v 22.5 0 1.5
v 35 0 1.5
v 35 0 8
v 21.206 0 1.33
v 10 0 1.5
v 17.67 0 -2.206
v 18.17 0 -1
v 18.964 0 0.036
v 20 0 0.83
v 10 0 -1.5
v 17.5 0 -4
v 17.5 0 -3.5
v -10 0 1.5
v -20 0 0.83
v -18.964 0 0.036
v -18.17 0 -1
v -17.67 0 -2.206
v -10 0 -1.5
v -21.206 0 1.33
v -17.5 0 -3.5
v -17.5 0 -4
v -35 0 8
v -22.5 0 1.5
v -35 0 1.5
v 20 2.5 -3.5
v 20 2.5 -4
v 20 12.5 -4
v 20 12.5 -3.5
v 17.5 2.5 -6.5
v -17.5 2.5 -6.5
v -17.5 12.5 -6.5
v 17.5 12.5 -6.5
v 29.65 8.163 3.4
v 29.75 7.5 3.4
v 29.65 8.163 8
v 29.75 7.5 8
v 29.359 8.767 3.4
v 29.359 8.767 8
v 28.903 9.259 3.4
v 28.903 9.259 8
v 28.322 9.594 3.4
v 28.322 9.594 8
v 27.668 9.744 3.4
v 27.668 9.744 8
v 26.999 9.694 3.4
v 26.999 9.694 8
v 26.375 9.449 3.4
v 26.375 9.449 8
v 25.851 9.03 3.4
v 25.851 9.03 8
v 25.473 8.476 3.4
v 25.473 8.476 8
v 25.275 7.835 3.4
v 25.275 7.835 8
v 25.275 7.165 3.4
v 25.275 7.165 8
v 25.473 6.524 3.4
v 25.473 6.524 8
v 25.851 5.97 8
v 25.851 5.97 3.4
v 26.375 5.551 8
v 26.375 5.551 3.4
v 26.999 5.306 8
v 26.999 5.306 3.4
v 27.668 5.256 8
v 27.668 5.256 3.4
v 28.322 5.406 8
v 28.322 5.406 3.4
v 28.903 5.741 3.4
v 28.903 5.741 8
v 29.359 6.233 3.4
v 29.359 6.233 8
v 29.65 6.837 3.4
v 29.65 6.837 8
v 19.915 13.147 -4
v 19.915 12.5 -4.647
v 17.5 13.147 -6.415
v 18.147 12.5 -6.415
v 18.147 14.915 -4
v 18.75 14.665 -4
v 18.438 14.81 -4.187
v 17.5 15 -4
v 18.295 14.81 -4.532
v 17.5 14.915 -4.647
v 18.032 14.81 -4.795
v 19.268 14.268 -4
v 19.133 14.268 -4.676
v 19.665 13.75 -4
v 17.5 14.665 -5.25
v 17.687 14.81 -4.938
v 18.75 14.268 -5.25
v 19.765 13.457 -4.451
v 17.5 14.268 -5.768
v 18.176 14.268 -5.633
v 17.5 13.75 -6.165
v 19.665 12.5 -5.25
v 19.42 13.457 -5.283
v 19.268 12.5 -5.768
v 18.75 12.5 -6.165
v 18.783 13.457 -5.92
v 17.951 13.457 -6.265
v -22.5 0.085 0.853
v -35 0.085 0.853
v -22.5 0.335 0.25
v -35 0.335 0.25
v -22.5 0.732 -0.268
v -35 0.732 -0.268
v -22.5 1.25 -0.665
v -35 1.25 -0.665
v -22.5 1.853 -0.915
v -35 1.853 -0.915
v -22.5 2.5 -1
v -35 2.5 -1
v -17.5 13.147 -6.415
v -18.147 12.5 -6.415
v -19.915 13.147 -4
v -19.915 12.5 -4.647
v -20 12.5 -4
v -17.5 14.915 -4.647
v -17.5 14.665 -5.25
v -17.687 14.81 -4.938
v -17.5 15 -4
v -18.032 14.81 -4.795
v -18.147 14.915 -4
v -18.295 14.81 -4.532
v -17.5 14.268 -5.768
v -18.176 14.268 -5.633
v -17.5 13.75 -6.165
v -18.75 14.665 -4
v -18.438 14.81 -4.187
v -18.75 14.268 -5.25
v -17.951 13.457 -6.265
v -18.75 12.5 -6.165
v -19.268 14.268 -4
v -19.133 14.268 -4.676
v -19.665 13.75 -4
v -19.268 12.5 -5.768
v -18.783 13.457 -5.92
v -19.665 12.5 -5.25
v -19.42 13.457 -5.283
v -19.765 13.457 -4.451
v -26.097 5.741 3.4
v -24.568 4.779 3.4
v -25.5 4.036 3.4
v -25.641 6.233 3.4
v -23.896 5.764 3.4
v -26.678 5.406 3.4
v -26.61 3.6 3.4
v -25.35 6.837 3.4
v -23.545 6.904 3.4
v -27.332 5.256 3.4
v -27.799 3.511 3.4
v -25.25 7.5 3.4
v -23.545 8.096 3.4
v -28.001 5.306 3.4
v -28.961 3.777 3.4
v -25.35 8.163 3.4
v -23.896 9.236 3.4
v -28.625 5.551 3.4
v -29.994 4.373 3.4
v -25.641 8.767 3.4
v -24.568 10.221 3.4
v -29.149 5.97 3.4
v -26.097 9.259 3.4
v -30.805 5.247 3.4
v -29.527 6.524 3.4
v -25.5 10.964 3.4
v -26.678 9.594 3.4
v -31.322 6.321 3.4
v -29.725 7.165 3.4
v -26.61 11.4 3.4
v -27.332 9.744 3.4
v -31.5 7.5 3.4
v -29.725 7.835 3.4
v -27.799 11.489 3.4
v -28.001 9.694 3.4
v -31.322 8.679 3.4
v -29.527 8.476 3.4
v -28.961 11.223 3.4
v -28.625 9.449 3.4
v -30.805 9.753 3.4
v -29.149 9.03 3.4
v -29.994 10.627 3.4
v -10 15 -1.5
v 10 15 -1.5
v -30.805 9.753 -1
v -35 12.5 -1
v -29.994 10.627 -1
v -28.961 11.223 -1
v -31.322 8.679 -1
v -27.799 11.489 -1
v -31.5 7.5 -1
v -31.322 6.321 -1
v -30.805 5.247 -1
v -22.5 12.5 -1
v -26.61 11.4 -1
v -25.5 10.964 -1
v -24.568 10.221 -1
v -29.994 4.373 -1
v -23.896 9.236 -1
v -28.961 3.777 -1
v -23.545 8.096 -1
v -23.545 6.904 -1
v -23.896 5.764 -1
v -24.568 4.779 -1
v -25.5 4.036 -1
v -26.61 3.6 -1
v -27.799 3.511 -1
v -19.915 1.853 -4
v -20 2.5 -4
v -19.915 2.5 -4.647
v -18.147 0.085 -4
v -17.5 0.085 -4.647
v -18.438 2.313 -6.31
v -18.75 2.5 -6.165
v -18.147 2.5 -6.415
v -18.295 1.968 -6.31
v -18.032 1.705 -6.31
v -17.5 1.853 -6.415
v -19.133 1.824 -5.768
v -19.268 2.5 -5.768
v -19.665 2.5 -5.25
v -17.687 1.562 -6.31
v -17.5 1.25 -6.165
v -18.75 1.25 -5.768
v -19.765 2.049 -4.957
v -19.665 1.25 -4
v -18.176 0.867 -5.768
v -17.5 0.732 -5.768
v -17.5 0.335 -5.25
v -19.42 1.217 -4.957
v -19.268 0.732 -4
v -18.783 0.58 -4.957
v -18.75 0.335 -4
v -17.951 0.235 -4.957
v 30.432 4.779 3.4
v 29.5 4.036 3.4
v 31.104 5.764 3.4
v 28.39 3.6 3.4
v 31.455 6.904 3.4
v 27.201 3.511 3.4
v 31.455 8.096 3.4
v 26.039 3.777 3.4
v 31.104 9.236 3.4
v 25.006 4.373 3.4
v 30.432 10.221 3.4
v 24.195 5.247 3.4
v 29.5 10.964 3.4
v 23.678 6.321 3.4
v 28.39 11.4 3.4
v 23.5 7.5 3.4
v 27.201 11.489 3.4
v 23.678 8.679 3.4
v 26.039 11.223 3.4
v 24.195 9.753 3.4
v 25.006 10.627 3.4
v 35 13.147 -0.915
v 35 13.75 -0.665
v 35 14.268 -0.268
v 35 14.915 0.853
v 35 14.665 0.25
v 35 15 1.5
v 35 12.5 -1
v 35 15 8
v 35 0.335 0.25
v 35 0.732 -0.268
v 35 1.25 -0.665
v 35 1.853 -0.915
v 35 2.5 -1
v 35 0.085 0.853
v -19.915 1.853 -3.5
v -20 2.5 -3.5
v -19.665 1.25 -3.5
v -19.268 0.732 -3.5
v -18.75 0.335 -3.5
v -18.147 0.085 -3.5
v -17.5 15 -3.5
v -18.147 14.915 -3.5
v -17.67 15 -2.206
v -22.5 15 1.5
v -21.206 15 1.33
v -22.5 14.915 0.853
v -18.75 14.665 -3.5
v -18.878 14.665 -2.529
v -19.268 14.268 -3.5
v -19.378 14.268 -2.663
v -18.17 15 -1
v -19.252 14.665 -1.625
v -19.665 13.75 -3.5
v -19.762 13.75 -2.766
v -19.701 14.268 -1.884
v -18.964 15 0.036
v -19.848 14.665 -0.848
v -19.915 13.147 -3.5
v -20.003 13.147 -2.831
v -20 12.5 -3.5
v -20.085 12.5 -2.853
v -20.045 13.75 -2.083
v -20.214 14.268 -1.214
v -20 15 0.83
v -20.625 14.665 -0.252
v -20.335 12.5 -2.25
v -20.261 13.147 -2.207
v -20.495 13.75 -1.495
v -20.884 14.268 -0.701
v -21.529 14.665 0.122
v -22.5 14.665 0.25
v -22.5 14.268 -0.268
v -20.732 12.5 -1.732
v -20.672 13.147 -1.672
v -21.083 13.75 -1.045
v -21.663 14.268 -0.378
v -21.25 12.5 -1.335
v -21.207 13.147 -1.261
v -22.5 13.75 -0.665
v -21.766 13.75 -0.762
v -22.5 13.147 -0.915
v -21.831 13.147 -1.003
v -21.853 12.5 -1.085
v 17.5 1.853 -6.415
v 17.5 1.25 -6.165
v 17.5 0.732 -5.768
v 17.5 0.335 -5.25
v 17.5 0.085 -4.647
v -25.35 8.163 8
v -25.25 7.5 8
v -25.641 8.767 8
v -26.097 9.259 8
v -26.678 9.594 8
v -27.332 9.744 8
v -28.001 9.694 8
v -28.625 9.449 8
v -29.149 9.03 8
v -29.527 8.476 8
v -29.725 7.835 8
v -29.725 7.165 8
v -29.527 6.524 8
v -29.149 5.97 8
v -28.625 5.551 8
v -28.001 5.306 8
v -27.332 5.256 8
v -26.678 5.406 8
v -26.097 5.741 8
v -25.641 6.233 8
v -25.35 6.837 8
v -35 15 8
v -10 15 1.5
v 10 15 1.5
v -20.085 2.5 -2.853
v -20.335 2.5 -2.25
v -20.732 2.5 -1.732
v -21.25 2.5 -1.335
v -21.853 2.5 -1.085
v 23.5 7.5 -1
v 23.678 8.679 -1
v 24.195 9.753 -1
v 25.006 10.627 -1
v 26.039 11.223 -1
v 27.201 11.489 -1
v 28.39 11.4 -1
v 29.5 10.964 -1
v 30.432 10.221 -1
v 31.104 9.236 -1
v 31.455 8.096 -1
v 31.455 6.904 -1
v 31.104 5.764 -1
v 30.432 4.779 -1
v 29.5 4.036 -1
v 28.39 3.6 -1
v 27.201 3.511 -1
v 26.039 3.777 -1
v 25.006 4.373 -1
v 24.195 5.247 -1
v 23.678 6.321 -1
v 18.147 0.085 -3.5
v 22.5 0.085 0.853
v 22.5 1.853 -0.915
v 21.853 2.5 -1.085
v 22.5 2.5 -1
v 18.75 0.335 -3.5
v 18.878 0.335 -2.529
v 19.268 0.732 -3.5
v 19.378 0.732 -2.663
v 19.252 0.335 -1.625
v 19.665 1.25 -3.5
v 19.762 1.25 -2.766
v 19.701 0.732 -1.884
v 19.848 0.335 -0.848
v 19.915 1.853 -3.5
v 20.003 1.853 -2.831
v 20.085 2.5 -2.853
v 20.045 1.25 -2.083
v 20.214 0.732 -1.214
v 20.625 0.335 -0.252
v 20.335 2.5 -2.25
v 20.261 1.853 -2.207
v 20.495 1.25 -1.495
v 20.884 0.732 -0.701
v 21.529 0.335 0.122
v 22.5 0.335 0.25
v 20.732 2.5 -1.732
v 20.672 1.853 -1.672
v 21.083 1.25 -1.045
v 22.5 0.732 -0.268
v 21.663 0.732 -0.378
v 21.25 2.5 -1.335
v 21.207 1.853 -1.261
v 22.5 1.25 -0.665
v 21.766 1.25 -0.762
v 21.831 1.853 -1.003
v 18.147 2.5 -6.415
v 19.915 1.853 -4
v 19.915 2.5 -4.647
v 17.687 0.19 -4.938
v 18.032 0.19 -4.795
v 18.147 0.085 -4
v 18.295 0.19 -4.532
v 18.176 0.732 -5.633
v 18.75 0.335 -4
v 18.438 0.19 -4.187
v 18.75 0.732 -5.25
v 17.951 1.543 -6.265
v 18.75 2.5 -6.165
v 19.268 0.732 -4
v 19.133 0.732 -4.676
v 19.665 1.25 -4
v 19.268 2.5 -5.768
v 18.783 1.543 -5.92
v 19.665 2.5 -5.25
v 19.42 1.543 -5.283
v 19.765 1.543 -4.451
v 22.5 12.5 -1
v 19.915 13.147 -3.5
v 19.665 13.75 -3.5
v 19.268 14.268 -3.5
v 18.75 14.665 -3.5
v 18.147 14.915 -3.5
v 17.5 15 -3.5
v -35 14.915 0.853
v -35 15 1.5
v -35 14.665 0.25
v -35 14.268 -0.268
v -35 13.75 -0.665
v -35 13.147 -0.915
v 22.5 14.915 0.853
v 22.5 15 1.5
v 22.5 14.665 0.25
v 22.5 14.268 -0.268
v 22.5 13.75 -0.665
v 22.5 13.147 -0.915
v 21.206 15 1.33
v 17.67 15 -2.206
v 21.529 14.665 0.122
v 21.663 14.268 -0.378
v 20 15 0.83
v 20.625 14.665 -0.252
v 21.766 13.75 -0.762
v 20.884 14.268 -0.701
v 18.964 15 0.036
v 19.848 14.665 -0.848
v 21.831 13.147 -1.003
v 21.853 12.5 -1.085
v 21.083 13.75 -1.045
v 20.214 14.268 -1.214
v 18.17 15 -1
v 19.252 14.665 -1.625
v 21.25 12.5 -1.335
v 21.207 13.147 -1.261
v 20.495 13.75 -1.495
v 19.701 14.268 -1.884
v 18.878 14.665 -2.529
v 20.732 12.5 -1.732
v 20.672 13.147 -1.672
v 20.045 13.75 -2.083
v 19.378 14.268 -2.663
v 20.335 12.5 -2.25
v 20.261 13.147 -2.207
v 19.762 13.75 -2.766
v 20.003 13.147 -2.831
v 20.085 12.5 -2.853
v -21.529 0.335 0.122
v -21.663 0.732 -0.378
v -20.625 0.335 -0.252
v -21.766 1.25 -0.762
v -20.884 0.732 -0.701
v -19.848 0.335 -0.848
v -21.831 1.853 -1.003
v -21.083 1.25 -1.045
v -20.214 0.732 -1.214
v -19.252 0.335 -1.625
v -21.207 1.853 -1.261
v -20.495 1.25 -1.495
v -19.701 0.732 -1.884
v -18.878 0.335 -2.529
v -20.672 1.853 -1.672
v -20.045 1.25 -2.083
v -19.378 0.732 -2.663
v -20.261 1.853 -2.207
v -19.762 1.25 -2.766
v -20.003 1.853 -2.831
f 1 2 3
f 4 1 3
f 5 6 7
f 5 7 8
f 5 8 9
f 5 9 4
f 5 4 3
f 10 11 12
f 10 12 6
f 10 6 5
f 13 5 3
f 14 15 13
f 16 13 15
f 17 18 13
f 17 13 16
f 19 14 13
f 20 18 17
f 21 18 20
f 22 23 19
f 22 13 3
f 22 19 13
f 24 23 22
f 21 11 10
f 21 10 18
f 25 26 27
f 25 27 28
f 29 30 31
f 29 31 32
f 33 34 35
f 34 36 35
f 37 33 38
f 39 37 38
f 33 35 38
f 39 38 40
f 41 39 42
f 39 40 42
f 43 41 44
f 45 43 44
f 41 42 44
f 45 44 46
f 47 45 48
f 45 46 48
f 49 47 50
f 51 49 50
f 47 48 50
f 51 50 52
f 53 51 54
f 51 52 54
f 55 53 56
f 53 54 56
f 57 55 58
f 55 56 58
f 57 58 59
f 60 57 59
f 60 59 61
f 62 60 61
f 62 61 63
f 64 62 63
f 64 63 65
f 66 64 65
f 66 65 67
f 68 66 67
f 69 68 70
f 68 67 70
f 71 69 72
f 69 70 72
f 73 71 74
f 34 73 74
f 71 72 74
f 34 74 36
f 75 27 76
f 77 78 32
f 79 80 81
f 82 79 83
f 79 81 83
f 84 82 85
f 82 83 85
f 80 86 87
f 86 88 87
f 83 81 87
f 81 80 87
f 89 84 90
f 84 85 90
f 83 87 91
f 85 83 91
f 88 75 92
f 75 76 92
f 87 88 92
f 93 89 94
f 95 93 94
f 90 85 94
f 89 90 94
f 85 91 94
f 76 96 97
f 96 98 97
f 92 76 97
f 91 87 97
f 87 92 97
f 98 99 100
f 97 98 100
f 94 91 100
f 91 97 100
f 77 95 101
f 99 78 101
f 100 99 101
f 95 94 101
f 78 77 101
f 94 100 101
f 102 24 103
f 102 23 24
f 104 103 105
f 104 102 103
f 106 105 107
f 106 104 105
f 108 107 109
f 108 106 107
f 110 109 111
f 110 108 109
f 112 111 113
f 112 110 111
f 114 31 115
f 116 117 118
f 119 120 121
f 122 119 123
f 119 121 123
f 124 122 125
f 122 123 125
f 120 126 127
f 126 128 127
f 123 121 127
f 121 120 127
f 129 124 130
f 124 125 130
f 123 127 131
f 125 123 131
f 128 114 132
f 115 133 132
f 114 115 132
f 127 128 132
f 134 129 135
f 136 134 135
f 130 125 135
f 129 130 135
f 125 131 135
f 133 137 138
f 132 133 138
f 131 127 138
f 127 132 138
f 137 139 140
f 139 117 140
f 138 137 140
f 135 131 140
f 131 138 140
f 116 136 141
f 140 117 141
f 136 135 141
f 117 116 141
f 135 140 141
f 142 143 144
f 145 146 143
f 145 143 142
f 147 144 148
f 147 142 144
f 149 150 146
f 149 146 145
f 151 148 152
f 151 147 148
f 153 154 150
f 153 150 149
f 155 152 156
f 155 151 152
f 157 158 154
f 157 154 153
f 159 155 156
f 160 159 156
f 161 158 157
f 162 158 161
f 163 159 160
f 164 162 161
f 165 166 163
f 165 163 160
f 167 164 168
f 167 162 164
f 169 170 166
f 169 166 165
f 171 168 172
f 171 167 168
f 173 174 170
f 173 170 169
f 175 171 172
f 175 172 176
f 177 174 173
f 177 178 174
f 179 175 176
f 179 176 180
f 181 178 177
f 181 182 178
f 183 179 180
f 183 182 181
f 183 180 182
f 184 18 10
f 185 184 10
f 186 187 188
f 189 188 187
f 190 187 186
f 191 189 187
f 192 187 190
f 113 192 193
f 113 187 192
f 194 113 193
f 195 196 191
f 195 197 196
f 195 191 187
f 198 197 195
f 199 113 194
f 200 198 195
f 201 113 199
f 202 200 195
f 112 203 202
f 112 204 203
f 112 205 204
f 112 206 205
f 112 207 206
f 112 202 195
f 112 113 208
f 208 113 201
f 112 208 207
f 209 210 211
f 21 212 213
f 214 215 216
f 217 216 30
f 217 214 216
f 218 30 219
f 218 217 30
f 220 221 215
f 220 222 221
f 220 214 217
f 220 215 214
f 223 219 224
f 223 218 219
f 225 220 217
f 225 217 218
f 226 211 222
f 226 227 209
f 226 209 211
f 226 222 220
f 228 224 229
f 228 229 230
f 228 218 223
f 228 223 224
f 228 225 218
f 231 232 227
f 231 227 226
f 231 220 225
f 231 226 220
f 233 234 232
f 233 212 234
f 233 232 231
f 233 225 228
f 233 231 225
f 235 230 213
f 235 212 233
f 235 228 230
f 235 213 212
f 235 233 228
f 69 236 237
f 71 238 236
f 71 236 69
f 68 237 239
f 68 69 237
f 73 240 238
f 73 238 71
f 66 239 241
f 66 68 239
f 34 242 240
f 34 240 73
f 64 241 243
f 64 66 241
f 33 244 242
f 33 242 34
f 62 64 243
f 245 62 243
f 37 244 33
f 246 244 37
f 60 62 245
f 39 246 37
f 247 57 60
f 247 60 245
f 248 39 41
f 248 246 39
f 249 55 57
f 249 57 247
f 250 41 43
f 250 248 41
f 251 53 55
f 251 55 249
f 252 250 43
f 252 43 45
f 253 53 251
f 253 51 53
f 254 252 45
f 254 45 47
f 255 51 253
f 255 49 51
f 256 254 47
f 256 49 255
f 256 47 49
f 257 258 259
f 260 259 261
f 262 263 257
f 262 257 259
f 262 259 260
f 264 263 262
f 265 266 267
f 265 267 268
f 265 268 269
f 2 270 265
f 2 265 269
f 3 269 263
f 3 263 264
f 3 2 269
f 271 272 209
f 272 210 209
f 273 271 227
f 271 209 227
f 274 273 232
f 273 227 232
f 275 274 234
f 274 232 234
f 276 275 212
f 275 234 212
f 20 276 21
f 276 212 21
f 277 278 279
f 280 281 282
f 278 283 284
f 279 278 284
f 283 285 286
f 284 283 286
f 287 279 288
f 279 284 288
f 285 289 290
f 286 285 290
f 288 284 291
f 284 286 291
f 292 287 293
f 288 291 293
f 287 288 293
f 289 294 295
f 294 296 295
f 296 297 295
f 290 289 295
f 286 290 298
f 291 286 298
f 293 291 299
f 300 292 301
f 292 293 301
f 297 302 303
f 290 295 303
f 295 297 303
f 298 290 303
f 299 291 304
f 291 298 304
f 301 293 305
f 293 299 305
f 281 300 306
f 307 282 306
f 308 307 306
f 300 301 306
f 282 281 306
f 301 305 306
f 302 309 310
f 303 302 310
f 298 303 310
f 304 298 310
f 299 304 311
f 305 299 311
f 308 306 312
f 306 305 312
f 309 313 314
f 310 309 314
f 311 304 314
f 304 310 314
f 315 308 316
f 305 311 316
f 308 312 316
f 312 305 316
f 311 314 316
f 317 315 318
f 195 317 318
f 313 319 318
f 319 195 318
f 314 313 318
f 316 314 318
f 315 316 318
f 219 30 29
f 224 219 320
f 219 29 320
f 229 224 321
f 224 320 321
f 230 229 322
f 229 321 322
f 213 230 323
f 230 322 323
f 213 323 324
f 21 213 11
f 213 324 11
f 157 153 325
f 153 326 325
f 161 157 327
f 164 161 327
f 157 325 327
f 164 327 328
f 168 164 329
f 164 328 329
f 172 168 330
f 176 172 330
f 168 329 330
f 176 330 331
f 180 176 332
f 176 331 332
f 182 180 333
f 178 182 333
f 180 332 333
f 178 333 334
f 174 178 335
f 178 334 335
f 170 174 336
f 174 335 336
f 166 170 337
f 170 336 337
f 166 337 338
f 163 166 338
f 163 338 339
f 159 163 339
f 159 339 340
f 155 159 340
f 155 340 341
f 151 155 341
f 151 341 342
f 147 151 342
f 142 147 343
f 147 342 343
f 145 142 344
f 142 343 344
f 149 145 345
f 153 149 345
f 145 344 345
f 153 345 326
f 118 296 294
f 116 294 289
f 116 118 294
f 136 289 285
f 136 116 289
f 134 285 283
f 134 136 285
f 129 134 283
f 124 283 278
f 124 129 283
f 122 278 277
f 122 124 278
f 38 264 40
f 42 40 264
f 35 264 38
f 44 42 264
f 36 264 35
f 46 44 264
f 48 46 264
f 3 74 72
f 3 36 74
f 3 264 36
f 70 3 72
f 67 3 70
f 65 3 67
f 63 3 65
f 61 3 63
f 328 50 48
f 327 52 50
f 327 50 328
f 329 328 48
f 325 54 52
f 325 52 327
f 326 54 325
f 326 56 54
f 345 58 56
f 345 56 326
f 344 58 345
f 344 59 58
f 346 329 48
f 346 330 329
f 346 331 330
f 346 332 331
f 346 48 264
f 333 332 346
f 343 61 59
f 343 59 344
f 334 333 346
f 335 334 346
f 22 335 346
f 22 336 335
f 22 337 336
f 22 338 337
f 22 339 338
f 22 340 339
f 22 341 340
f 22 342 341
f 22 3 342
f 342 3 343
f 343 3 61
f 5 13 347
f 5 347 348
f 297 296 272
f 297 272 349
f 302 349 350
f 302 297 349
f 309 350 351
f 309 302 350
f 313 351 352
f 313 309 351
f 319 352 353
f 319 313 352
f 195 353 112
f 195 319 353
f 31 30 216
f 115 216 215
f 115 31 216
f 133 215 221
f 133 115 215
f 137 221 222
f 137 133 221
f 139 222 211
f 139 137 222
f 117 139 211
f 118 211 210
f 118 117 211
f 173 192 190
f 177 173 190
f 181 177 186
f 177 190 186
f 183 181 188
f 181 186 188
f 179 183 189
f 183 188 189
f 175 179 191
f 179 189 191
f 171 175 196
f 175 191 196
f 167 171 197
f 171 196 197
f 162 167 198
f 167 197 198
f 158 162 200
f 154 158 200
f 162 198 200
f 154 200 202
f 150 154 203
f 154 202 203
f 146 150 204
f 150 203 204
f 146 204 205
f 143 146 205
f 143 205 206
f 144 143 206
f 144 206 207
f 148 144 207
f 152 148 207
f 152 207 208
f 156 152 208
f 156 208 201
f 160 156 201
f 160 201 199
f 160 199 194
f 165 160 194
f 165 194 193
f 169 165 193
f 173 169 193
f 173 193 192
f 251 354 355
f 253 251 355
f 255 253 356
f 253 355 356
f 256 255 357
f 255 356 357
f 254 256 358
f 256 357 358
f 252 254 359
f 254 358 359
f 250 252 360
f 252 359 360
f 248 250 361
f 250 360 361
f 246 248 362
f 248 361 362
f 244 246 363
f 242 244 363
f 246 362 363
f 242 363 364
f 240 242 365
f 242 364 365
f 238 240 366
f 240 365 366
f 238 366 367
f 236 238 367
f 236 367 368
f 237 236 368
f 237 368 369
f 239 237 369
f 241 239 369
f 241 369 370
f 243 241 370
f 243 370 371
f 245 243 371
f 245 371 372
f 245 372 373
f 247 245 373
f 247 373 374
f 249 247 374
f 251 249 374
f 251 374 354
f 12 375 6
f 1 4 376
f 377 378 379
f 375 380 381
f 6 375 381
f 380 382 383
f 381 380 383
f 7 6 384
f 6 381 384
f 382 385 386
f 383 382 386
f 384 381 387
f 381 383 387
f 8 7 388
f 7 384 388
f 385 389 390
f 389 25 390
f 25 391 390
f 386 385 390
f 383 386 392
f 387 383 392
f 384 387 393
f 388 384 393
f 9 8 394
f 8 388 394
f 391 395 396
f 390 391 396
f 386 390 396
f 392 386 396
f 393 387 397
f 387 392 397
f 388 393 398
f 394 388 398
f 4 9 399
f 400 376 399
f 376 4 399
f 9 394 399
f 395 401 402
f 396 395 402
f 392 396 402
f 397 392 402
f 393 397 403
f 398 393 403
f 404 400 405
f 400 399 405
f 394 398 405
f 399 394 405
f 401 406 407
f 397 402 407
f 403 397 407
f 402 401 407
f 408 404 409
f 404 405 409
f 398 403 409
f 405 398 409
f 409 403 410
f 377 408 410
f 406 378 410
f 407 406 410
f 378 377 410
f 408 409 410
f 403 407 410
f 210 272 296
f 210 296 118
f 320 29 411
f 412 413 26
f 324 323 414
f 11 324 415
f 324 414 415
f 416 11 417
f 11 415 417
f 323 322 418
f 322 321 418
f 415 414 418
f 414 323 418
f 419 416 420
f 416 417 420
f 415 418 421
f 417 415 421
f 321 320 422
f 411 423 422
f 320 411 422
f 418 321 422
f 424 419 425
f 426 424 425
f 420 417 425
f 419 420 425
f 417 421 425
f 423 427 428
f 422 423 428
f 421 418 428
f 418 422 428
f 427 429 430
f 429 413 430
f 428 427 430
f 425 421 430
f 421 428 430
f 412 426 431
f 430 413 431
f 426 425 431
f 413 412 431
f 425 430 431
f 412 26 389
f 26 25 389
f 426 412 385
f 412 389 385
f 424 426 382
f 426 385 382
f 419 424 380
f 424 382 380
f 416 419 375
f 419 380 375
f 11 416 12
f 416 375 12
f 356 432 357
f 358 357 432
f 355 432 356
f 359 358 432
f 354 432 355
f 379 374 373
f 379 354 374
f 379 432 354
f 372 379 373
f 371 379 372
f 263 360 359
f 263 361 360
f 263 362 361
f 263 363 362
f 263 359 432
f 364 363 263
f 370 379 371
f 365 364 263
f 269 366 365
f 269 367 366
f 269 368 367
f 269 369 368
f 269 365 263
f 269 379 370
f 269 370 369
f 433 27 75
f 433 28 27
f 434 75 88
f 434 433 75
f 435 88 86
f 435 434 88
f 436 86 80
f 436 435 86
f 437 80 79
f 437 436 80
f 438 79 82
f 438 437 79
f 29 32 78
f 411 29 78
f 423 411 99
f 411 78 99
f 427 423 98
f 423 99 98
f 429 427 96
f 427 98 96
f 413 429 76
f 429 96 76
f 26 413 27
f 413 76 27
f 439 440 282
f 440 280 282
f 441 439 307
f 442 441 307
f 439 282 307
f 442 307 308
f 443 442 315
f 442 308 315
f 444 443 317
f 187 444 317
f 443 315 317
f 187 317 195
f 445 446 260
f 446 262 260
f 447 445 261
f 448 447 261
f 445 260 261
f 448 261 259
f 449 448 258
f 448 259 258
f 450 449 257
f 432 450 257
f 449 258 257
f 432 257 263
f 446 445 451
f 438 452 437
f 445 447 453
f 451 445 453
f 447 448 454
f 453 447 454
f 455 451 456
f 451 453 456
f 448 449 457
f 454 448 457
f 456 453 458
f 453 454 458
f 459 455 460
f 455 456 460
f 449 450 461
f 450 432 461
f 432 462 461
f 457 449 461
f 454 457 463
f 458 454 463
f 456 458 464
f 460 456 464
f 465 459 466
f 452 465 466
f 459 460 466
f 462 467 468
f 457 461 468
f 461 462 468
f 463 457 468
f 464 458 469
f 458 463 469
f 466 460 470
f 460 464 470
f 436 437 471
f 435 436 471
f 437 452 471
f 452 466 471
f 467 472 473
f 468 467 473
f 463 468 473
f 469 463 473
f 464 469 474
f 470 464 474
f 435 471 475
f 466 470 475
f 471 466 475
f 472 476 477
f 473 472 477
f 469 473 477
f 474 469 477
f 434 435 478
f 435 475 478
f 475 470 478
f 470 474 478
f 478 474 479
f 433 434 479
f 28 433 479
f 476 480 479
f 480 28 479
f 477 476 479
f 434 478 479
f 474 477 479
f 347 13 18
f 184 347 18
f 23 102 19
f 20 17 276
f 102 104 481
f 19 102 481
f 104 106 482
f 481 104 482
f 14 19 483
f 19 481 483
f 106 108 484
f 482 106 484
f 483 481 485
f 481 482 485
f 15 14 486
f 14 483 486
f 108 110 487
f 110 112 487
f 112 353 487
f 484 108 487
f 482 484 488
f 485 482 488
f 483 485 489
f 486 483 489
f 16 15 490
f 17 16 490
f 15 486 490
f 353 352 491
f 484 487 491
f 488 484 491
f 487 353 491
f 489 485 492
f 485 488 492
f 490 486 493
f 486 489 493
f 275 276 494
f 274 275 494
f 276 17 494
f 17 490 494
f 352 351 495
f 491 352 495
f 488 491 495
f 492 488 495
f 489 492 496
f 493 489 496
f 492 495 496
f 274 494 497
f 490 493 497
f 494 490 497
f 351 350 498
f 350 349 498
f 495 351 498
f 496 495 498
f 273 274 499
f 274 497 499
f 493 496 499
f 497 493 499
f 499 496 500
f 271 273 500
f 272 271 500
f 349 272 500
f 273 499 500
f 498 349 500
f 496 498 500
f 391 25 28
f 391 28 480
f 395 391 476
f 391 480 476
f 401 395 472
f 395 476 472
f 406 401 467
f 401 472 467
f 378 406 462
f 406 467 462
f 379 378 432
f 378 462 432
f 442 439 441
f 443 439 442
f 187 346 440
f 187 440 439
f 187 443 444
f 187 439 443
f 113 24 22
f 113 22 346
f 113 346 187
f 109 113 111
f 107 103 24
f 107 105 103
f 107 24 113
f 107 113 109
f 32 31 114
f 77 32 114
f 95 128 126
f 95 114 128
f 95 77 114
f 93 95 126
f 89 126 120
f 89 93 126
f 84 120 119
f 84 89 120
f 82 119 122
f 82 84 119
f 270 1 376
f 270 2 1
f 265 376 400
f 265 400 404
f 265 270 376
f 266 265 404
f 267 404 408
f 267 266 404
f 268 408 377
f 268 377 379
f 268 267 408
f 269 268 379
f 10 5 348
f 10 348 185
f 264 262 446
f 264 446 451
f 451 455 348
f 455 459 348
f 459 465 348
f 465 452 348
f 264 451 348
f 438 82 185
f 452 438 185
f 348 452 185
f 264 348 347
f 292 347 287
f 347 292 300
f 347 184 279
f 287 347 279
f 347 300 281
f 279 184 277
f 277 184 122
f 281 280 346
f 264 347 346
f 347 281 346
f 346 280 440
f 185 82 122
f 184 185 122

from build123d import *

# Parameters (mm, degrees)
SKETCH1_W                                           = 20
SKETCH1_H                                           = 3
BOSS_EXTRUDE1_DEPTH                                 = 15
CBORE_FOR_M4_HEX_SOCKET_HEAD_CAP_SCREW1_D           = 4.5
CBORE_FOR_M4_HEX_SOCKET_HEAD_CAP_SCREW1_CBORE_D     = 8
CBORE_FOR_M4_HEX_SOCKET_HEAD_CAP_SCREW1_CBORE_DEPTH = 4.4
FILLET1_R                                           = 2.5


with BuildPart() as part:
    # Sketch1 → Boss-Extrude1 (new body)
    with BuildSketch(Plane(origin=(0, 0, 0), x_dir=(1, 0, 0), z_dir=(0, 1, 0))):
        Polygon((-20, 6.5), (20, 6.5), (20, 1), (35, 1), (35, -8), (-35, -8), (-35, 1), (-20, 1), align=None)
        Rectangle(SKETCH1_W, SKETCH1_H, mode=Mode.SUBTRACT)
    extrude(amount=BOSS_EXTRUDE1_DEPTH)

    # CBORE for M4 Hex Socket Head Cap Screw1 (through all)
    with Locations(Plane(origin=(27.5, 7.5, -1), x_dir=(-1, 0, 0), z_dir=(0, 0, -1))):
        with Locations((0, 0), (55, 0)):
            CounterBoreHole(CBORE_FOR_M4_HEX_SOCKET_HEAD_CAP_SCREW1_D / 2, CBORE_FOR_M4_HEX_SOCKET_HEAD_CAP_SCREW1_CBORE_D / 2, CBORE_FOR_M4_HEX_SOCKET_HEAD_CAP_SCREW1_CBORE_DEPTH)

    # Fillet1
    fillet1_edges = [part.edges().sort_by_distance(p)[0] for p in [
        (-27.5, 0, -1),
        (-20, 0, -3.75),
        (-20, 7.5, -6.5),
        (20, 7.5, -6.5),
        (20, 7.5, -1),
        (-20, 7.5, -1),
        (27.5, 15, -1),
        (20, 15, -3.75),
        (0, 15, -6.5),
        (-20, 15, -3.75),
        (0, 0, -6.5),
        (-27.5, 15, -1),
        (20, 0, -3.75),
        (27.5, 0, -1),
    ]]
    fillet(fillet1_edges, radius=FILLET1_R)


solid = part.part
